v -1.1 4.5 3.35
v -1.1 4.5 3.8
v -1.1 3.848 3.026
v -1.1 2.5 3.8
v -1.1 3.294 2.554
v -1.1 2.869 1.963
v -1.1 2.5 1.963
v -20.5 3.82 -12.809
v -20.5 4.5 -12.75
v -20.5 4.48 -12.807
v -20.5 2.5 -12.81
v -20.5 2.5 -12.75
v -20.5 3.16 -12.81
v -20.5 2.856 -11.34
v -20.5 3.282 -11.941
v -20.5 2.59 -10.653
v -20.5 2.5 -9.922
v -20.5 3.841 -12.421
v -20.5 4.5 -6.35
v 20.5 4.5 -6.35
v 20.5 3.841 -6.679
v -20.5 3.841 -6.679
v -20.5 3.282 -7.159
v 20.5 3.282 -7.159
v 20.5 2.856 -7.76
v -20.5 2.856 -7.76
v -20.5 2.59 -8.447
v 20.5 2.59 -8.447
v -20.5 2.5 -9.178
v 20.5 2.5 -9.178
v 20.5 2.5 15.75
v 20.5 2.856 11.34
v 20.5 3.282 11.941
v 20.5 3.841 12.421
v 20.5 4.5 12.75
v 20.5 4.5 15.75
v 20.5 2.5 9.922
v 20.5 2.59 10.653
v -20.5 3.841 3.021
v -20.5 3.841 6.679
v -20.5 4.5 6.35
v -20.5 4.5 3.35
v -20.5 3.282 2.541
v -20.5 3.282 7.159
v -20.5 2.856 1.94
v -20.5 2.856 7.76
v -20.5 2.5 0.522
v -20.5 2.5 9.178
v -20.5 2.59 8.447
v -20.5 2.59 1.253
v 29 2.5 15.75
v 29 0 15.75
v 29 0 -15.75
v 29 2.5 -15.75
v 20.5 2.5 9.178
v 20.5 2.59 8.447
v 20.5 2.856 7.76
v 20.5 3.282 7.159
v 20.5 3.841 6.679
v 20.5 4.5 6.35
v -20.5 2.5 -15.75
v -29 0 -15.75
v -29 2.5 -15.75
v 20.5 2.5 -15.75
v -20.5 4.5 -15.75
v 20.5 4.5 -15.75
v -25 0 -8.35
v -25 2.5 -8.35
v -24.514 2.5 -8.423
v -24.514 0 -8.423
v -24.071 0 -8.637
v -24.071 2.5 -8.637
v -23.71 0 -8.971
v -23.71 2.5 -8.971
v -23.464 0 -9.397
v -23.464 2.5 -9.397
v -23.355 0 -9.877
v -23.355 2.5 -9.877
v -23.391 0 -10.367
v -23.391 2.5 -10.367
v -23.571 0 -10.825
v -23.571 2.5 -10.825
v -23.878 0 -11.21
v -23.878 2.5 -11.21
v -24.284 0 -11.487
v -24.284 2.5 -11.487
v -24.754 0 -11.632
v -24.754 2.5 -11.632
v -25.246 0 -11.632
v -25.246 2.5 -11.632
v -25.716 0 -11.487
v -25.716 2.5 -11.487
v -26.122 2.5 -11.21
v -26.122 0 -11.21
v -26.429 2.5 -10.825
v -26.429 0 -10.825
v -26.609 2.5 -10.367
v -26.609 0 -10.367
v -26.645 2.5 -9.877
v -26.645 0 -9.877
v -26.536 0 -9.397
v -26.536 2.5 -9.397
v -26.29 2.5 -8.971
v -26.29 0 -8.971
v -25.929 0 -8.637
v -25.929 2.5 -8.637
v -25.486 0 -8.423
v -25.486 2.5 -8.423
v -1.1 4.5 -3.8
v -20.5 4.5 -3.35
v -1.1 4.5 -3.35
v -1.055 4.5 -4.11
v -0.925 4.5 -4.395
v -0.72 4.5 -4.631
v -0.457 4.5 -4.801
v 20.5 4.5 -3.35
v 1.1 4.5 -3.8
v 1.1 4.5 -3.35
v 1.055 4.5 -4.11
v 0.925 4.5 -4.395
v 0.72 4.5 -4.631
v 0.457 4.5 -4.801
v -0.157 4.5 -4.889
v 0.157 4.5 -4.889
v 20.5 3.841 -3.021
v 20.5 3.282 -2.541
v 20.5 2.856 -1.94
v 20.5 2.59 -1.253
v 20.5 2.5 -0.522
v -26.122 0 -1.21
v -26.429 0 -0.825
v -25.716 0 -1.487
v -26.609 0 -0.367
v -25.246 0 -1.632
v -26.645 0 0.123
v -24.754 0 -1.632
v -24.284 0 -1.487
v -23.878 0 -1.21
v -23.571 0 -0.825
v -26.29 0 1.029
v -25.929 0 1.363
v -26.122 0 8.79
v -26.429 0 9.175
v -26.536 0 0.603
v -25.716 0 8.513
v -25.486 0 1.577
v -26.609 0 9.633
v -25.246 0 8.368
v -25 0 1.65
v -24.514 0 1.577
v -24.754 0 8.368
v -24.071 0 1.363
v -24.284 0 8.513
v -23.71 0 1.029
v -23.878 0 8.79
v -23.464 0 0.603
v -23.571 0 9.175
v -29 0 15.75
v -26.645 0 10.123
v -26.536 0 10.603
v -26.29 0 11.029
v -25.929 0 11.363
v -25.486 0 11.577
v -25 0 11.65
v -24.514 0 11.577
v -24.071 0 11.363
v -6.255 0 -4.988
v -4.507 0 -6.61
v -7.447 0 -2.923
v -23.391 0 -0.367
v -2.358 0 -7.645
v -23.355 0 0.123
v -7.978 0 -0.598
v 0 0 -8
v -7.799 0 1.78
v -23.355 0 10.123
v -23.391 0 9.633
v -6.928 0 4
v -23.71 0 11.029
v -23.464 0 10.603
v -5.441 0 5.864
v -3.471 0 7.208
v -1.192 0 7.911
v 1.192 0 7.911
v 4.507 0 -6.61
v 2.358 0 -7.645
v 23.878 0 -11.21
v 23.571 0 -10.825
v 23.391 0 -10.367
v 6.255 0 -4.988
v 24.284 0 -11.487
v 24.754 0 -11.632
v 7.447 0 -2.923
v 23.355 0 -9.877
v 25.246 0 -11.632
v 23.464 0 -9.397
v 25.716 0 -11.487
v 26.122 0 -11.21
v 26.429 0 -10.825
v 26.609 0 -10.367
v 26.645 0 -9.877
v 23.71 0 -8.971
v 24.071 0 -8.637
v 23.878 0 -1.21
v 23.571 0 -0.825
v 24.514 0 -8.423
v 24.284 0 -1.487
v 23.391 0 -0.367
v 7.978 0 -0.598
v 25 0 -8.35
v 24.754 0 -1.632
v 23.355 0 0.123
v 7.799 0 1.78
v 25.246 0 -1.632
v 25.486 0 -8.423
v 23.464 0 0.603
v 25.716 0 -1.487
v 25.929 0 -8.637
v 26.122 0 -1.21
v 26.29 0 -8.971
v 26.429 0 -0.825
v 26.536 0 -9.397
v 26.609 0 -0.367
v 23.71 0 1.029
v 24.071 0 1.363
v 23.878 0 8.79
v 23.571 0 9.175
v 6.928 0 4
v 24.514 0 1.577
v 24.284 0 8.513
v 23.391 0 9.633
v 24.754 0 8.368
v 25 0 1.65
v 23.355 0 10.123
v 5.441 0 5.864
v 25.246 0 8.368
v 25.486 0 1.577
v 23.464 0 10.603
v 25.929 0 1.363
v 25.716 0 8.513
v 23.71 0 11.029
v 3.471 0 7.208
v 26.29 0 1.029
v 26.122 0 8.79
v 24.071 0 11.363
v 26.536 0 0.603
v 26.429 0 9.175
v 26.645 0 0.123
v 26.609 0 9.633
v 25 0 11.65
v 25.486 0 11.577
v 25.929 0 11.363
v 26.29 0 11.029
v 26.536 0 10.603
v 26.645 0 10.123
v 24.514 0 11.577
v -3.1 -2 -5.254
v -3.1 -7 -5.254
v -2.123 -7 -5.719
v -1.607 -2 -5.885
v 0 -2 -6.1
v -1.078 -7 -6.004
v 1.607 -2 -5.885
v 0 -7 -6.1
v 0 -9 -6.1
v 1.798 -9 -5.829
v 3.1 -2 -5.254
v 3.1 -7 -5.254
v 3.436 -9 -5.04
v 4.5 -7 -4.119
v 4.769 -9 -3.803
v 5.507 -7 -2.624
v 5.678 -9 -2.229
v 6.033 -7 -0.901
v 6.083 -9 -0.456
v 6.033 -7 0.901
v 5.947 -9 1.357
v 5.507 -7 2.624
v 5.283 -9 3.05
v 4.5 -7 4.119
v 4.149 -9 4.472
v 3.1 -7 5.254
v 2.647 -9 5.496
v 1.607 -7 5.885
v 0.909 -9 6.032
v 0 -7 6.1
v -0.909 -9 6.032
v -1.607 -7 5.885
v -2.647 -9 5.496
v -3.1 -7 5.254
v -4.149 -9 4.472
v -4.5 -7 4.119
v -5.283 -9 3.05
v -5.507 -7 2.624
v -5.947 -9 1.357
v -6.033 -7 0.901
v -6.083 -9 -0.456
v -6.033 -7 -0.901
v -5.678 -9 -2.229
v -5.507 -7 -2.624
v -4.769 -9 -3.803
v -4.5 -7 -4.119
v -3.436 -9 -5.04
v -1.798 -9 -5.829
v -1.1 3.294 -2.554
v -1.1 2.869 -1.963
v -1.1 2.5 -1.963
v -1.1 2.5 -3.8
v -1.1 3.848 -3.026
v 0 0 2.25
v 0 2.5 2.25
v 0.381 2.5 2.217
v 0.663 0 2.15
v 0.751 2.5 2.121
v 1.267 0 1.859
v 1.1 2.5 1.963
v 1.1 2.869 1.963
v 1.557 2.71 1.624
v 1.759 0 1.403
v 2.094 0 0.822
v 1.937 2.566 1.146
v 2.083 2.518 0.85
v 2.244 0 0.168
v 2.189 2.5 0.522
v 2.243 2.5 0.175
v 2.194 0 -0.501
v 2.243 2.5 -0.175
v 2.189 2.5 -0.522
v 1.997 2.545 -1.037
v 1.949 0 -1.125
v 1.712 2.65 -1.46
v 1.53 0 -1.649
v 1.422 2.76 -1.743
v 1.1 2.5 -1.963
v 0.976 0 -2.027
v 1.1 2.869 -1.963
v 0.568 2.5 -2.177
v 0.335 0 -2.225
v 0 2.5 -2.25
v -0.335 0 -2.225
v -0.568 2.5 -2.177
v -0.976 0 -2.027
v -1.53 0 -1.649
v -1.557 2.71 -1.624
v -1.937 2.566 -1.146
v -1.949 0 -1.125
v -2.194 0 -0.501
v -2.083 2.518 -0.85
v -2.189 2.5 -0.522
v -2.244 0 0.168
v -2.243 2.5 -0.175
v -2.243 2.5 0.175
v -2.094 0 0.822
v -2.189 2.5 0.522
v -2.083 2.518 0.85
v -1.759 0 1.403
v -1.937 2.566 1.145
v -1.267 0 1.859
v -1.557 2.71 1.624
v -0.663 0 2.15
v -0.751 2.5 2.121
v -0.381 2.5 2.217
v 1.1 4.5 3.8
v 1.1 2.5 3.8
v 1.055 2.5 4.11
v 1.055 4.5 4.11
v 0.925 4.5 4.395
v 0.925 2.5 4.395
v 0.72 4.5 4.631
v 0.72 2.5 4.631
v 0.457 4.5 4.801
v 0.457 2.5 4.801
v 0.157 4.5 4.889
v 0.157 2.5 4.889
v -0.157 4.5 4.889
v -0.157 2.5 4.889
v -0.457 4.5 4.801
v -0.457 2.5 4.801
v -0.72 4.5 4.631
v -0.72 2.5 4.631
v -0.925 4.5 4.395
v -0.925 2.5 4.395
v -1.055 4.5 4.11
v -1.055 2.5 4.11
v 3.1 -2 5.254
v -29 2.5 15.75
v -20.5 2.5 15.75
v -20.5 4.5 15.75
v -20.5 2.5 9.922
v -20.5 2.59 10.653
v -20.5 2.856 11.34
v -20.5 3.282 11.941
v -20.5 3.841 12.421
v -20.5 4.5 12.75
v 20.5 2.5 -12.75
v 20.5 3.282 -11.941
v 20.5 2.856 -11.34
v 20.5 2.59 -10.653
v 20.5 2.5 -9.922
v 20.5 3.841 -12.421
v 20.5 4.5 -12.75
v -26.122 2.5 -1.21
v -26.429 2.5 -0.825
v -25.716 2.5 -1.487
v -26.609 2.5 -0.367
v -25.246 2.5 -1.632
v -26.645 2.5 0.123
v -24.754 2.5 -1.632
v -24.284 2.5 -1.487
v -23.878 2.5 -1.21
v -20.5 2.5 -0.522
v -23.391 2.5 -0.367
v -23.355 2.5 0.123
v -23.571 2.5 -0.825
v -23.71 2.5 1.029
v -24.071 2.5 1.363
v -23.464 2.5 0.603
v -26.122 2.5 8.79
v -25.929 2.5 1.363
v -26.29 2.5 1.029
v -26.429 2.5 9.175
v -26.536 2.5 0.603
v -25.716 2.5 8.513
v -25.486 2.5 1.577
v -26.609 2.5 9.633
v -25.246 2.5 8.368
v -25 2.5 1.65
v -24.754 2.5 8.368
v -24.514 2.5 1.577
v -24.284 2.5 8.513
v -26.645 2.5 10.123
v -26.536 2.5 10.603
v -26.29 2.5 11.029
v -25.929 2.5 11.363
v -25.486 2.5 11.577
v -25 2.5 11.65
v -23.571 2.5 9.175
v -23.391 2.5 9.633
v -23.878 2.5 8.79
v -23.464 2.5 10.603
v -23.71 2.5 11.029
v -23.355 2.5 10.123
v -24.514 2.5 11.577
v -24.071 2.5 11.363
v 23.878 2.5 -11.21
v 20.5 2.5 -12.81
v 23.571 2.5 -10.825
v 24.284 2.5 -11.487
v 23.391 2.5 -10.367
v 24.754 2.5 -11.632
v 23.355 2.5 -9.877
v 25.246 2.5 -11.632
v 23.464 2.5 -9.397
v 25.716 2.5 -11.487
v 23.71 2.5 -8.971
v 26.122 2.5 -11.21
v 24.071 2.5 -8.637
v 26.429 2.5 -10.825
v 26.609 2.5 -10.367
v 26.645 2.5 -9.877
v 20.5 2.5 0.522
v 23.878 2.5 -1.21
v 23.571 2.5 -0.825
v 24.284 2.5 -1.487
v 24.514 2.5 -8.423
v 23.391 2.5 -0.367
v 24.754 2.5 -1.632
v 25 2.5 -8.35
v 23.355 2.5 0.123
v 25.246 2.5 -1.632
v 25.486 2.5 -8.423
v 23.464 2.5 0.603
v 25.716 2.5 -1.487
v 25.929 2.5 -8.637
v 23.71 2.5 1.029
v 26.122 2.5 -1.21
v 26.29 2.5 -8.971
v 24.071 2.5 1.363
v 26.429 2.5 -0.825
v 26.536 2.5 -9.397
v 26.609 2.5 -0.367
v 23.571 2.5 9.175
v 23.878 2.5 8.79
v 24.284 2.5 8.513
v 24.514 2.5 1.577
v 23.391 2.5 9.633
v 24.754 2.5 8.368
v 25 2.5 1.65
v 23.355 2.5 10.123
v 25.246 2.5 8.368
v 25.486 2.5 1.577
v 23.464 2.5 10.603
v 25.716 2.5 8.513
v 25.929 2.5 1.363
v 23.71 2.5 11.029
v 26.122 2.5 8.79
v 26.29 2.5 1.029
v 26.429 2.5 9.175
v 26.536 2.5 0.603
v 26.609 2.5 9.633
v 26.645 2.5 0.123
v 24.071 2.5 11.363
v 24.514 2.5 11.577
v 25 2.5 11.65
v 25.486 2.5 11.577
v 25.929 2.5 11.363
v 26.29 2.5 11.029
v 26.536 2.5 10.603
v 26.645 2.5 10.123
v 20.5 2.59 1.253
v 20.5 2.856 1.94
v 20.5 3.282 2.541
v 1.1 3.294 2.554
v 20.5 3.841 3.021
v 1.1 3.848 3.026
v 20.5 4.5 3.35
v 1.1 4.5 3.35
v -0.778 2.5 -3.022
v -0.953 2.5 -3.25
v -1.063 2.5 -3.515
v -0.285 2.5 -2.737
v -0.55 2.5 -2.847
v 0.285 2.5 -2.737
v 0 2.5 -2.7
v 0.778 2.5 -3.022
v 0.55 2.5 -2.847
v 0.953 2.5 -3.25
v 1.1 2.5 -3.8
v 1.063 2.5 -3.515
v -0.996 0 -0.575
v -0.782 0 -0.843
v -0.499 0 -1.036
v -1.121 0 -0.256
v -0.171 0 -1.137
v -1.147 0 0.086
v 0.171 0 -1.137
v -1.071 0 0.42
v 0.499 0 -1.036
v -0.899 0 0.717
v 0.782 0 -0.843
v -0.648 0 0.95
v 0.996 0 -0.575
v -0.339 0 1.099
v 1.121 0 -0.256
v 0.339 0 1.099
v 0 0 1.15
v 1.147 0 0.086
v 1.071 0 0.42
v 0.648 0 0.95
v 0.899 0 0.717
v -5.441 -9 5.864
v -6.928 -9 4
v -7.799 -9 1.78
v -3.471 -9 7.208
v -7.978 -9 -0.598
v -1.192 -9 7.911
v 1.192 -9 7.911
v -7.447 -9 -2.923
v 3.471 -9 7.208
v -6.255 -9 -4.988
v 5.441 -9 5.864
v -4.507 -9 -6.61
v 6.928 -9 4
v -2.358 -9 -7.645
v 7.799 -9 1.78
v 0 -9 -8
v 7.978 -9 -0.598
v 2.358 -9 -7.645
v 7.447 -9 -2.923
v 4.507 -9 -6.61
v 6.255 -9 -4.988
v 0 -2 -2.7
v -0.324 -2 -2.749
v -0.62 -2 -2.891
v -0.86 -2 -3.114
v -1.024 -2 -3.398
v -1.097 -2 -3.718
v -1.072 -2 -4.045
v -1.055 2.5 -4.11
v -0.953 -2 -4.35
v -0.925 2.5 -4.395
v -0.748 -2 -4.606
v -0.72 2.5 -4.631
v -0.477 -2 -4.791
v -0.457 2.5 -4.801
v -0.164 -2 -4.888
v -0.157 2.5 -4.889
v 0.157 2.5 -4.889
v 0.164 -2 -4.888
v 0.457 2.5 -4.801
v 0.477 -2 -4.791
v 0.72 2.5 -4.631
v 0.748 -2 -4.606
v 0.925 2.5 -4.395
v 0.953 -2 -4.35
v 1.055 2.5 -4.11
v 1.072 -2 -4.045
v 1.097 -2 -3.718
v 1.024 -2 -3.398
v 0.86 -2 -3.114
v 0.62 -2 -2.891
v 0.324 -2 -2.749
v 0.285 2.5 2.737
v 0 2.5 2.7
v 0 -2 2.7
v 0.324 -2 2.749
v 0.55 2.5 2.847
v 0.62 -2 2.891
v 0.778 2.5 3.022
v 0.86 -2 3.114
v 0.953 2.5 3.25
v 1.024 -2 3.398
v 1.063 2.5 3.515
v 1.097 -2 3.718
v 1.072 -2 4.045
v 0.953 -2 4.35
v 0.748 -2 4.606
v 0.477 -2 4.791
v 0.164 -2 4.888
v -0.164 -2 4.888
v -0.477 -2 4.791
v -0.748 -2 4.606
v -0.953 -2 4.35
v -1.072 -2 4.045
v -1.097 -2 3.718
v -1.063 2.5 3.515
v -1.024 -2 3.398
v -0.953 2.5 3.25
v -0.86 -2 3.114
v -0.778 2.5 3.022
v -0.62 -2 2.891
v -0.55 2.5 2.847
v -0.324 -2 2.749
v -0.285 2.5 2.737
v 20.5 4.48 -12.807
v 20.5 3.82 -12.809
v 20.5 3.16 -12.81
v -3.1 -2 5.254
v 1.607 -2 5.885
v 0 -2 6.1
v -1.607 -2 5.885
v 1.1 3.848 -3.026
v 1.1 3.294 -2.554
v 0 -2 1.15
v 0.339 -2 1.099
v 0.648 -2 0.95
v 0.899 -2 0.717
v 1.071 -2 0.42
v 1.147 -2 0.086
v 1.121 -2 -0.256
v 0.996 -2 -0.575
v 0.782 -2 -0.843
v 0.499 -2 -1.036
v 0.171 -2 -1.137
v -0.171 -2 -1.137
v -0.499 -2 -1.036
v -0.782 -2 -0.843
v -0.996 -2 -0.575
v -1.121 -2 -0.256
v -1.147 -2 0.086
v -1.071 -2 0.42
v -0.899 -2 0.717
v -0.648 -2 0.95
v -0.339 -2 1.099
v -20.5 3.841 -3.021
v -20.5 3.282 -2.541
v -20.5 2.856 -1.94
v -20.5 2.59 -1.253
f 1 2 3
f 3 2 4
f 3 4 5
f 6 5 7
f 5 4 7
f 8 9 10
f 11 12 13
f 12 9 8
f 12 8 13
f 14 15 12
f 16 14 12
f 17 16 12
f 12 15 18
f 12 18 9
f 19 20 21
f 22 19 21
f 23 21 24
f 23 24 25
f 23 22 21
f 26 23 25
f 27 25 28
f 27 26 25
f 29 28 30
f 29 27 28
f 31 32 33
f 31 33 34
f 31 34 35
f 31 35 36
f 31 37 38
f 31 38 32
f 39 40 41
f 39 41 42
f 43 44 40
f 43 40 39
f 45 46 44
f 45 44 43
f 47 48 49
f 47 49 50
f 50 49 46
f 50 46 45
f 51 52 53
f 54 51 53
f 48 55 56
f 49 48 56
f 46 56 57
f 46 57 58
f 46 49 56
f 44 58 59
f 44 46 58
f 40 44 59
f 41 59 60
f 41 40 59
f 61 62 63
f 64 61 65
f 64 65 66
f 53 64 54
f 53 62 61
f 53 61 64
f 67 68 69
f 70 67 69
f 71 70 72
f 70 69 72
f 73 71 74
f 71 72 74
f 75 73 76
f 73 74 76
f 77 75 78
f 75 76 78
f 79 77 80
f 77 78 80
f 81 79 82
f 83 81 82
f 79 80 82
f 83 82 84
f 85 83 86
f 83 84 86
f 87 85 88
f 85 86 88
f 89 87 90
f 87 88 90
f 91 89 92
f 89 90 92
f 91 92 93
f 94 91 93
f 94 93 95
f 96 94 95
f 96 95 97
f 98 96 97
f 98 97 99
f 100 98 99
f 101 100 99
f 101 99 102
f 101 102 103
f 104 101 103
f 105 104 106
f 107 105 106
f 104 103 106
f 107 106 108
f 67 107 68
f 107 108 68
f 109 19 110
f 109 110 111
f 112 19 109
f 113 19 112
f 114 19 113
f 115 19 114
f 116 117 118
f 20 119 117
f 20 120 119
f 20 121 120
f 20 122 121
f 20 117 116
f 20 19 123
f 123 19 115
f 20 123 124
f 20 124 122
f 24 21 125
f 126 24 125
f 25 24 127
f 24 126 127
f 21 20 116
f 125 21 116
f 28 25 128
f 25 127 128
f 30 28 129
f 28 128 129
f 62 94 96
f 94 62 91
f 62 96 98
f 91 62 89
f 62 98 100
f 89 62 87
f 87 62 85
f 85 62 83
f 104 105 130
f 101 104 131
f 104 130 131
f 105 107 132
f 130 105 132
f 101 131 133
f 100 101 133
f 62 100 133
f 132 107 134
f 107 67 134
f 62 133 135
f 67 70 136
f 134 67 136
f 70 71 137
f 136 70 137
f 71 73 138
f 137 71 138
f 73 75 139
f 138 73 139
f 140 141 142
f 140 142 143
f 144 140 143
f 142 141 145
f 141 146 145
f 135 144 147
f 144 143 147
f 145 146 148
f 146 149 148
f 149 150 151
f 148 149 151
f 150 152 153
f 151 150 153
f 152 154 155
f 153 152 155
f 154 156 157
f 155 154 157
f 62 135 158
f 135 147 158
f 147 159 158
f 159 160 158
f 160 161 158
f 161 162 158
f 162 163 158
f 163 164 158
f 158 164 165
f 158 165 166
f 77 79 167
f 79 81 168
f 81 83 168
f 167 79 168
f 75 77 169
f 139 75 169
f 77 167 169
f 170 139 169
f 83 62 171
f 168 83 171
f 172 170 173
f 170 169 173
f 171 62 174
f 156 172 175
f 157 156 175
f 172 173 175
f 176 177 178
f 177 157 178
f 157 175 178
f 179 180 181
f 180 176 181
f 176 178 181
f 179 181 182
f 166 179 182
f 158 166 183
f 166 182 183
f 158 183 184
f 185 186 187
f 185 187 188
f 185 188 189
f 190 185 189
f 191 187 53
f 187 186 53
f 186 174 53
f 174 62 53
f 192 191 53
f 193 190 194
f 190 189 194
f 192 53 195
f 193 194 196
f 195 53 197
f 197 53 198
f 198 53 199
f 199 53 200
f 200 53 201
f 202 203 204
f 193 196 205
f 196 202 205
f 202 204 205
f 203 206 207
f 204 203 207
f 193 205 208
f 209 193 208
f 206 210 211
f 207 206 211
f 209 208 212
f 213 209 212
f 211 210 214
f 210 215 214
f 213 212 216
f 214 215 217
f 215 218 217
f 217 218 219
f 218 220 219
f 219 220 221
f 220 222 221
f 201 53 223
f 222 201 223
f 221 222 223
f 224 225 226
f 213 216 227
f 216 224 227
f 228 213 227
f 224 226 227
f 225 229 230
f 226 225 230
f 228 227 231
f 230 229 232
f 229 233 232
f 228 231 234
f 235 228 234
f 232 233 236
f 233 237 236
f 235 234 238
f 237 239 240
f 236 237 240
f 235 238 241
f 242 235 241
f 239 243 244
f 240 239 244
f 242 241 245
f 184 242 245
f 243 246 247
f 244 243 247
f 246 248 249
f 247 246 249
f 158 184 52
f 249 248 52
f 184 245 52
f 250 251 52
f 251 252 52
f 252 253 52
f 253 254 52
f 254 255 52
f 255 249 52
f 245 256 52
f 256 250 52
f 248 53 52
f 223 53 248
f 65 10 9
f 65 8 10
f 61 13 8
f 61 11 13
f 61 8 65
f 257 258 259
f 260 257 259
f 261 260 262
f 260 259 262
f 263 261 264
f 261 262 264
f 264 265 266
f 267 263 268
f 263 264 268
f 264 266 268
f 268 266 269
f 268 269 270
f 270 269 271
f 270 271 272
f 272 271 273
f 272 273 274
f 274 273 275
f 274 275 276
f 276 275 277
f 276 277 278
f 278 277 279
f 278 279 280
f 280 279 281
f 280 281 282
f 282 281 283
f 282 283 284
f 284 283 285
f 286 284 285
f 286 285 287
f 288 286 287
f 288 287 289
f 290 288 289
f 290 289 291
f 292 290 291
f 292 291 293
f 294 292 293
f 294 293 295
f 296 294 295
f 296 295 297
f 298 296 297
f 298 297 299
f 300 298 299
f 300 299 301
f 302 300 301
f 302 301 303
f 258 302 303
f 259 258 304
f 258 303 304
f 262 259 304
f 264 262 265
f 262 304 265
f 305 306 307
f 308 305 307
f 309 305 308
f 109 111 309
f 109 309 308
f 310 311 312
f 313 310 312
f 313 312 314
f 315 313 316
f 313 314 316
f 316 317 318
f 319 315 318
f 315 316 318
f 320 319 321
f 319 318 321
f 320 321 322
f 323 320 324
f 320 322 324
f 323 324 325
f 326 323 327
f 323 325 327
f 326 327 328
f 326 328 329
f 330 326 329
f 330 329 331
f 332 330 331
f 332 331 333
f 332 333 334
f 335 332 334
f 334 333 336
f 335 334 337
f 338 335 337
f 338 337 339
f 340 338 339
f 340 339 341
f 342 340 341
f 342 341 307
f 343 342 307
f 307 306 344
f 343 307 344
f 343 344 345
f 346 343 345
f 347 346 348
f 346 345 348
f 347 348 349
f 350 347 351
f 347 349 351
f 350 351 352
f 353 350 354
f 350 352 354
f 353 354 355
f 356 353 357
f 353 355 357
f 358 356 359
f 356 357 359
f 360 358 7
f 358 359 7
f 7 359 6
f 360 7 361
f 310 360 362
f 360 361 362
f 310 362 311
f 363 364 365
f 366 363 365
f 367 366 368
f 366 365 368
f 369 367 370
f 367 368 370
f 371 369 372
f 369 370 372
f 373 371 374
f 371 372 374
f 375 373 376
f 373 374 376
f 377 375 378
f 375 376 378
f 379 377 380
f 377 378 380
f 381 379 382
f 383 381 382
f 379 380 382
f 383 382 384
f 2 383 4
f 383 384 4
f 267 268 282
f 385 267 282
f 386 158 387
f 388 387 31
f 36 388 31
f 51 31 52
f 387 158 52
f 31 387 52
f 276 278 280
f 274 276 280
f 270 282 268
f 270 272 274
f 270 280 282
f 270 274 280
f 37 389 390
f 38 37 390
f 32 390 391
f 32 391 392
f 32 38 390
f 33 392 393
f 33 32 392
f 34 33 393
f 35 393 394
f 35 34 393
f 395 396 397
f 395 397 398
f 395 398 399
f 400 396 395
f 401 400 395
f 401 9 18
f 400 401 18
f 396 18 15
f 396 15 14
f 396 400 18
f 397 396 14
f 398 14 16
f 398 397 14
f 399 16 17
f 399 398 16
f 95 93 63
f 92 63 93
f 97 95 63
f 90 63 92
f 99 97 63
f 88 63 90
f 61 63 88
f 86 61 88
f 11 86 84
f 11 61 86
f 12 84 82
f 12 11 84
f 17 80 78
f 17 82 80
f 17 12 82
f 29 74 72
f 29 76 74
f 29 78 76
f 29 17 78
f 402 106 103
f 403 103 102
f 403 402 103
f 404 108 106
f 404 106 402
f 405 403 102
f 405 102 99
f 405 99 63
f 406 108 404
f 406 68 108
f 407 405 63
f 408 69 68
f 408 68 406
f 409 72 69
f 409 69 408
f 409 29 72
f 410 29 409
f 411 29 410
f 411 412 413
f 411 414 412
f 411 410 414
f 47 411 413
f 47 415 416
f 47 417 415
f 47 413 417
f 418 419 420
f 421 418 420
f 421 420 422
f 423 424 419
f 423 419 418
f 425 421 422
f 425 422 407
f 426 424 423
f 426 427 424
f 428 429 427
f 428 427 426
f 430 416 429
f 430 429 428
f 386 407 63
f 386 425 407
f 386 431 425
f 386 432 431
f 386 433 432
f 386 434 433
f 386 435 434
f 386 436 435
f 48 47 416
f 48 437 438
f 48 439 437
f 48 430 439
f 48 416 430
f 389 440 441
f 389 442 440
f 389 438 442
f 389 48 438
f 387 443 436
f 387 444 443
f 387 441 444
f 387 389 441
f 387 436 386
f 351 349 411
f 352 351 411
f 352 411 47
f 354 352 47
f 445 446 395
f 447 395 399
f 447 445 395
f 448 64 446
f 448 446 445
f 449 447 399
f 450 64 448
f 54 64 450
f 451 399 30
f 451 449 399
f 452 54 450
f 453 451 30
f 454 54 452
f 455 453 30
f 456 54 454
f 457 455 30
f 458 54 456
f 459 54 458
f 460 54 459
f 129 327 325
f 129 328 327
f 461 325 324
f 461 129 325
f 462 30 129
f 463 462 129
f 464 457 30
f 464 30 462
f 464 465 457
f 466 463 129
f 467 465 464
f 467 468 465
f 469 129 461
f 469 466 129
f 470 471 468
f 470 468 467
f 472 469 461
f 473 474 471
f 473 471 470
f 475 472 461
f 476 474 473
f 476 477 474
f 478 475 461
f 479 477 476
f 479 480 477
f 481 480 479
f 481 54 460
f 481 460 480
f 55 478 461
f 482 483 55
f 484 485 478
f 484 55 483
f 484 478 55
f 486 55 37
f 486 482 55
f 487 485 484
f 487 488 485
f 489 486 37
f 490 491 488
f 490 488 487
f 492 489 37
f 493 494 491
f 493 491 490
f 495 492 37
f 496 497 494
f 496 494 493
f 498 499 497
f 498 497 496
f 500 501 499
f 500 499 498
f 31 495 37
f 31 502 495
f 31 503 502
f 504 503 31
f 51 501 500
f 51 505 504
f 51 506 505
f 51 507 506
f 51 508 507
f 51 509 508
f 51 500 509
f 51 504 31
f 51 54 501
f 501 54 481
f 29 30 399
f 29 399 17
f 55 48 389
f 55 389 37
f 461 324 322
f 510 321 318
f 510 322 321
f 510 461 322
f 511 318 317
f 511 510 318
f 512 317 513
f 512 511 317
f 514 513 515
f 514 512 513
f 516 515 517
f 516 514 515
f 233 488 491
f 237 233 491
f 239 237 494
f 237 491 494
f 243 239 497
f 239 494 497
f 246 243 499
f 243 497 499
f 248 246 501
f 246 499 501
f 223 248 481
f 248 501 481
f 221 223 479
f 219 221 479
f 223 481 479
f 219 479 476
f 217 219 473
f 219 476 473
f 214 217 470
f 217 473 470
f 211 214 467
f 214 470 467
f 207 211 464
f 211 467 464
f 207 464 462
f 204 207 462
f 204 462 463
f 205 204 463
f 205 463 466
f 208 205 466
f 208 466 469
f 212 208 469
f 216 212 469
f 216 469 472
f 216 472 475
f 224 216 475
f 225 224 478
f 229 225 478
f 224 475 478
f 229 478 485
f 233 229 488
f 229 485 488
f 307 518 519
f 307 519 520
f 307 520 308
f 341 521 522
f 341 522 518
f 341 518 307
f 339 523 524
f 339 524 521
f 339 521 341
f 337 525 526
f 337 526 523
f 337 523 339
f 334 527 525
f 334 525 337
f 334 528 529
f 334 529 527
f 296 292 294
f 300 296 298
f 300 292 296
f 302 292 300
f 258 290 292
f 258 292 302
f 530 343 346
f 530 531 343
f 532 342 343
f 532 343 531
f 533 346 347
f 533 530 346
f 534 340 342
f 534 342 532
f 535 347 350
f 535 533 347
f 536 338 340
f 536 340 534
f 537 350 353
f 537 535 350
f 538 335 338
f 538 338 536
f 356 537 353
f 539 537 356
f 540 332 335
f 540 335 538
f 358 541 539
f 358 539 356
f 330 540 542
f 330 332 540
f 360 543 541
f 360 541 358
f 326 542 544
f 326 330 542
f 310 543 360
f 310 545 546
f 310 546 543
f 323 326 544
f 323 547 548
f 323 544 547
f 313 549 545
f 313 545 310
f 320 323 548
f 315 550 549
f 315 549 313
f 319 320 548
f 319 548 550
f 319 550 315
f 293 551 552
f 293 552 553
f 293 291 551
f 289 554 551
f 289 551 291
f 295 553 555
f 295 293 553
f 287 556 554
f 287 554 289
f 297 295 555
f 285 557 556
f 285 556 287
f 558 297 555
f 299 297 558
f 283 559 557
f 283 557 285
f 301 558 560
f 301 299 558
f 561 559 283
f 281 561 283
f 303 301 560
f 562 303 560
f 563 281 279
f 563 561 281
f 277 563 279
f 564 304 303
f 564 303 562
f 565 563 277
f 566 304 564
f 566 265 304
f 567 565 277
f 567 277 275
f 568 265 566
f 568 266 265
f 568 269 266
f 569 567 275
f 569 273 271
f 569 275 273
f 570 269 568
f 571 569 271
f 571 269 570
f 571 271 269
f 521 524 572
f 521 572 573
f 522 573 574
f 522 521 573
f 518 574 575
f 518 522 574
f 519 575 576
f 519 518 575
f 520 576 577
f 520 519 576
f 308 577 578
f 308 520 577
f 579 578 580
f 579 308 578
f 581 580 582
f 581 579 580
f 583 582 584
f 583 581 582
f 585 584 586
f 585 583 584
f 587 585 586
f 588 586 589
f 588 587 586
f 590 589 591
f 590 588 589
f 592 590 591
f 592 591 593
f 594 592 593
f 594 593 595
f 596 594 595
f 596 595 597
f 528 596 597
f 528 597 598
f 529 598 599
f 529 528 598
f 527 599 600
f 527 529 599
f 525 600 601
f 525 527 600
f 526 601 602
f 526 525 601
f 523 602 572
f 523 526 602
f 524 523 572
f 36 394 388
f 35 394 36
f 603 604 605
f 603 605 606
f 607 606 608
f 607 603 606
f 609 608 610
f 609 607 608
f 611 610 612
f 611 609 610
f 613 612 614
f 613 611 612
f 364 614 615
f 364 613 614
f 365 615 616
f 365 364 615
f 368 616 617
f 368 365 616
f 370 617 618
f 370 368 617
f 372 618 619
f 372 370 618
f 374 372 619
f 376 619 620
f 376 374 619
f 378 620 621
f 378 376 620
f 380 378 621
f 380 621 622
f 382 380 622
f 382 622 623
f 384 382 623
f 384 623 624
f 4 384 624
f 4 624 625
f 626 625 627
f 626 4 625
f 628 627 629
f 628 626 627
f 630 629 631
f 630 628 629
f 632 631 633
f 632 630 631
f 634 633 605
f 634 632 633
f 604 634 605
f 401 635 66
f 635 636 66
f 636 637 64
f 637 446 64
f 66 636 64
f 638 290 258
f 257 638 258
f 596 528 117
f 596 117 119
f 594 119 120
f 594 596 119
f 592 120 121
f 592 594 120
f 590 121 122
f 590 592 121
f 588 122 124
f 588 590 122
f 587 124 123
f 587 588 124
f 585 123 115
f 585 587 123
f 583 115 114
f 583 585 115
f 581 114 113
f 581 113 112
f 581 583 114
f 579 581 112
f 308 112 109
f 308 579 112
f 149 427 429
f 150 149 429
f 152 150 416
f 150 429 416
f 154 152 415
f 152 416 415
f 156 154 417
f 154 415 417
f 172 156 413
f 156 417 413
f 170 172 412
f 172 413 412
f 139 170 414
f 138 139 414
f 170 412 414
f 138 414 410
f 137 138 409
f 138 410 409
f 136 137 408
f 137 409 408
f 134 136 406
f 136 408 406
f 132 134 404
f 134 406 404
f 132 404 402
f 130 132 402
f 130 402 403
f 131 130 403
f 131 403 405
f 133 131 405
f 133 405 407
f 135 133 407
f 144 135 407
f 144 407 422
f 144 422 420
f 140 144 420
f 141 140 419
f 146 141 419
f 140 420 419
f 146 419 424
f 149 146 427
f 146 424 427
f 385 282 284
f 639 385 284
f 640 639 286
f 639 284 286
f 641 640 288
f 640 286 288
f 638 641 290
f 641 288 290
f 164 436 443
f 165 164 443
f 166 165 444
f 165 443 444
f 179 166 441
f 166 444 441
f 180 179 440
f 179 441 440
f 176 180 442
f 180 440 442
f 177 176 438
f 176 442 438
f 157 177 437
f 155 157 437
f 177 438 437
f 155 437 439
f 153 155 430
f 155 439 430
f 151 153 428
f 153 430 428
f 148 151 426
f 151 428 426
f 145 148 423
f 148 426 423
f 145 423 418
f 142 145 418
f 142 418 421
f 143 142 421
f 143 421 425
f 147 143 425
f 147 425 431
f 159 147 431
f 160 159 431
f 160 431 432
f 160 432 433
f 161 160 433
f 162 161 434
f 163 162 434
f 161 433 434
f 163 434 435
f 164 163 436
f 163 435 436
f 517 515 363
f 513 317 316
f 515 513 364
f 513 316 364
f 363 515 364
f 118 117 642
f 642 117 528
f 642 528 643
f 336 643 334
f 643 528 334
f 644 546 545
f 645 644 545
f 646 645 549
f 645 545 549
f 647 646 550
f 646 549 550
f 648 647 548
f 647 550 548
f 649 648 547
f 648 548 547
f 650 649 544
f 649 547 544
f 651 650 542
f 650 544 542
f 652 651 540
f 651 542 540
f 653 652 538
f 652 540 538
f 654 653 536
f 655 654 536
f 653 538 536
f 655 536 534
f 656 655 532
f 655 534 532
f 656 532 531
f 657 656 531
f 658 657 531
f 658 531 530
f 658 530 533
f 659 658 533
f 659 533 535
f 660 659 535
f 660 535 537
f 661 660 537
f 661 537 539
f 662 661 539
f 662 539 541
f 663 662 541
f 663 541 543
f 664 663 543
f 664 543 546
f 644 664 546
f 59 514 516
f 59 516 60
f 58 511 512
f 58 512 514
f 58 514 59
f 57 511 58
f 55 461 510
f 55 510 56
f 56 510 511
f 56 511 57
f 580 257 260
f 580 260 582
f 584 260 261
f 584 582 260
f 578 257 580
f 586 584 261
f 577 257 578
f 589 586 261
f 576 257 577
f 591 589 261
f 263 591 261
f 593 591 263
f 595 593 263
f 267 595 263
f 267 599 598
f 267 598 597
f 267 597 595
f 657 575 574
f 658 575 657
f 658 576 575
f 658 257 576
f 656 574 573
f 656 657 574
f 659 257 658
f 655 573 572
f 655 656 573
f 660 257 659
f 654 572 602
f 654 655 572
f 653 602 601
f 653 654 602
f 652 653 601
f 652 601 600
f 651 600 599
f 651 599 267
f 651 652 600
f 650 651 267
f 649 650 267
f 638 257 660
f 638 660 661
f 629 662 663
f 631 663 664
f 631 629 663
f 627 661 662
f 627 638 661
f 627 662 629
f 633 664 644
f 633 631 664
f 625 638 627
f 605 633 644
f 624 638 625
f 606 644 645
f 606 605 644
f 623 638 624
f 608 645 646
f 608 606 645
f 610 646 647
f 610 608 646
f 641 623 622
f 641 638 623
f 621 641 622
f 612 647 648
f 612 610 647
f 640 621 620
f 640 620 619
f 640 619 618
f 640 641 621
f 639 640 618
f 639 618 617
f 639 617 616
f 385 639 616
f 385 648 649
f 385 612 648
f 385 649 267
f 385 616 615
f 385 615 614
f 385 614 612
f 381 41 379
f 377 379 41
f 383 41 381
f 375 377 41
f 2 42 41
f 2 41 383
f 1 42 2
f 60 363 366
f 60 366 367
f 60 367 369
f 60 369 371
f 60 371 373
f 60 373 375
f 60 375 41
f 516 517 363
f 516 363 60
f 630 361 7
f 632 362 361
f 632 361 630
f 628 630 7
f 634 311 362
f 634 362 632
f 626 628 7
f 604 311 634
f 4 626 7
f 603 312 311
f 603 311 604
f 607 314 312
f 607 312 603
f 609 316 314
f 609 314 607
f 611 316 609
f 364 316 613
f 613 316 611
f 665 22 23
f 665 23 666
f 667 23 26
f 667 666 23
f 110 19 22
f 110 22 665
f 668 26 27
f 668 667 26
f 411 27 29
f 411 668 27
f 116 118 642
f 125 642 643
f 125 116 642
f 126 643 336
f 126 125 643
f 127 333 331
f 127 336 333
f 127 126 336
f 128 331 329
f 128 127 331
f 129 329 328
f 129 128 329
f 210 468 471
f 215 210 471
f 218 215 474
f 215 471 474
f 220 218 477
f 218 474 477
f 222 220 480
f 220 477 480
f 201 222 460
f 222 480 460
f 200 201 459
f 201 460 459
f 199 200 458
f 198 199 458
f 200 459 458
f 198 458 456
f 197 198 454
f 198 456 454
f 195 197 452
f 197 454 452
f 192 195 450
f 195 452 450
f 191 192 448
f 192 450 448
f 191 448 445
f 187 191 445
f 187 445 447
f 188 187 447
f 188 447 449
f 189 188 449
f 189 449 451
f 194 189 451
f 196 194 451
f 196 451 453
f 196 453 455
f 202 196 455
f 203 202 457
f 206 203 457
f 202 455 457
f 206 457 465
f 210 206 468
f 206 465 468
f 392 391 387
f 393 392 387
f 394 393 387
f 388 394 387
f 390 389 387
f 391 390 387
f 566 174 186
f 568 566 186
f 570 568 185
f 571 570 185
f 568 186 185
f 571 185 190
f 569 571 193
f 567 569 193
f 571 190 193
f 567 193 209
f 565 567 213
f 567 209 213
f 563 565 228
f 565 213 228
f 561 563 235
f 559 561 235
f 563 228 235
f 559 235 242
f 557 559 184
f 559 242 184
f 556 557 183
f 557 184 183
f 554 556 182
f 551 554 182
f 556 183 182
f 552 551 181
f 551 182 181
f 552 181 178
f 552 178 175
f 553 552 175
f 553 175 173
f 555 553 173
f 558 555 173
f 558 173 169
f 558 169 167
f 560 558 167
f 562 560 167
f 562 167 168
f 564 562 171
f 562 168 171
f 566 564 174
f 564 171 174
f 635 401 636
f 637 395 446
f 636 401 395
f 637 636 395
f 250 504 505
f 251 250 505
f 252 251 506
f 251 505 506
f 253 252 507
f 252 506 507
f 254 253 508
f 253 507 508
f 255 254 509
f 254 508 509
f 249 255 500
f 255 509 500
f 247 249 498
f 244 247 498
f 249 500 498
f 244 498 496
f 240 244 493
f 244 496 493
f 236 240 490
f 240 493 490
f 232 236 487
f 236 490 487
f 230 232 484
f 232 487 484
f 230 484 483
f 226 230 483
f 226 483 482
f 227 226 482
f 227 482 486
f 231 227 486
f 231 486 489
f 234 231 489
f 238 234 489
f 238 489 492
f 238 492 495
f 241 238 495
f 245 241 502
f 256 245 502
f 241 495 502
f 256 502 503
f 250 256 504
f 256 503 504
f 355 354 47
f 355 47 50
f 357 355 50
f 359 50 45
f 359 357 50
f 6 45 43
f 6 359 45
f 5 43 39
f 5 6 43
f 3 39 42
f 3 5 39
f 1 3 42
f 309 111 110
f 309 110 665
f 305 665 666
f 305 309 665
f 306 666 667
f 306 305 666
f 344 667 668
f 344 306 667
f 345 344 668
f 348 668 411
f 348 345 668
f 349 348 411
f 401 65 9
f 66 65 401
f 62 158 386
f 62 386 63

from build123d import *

# Parameters (mm, degrees)
SKETCH_1_R               = 50
EXTRUDE_1_DEPTH          = 2.5
SKETCH_2_R               = 8
EXTRUDE_2_DEPTH          = 9
SKETCH_3_R               = 6.1
CUT_EXTRUDE_1_DEPTH      = 2
CUT_EXTRUDE_2_DEPTH      = 5
SKETCH_7_R               = 1.15
CUT_EXTRUDE_4_DEPTH      = 4.5
SKETCH_8_R               = 2.25
CUT_EXTRUDE_5_DEPTH      = 2.5
CUT_EXTRUDE_6_DEPTH      = 72.281133549
CUT_EXTRUDE_6_DEPTH_BACK = 72.281133549
SKETCH_11_R              = 1.1
SKETCH_14_R              = 1.65
CUT_EXTRUDE_7_DEPTH      = 2.5
CUT_EXTRUDE_START        = -2.5
SKETCH_15_R              = 50
SKETCH_15_W              = 58
SKETCH_15_H              = 31.5
CUT_EXTRUDE_8_DEPTH      = 2.5
SKETCH_16_W              = 41
SKETCH_16_H              = 3
EXTRUDE_4_DEPTH          = 2
CUT_EXTRUDE_9_DEPTH      = 2
FILLET_3_R               = 3


with BuildPart() as part:
    # Эскиз1 → Бобышка-Вытянуть1 (new body)
    with BuildSketch(Plane(origin=(0, 0, 0), x_dir=(1, 0, 0), z_dir=(0, 1, 0))):
        with Locations(Location((0, 0, 0), (0, 0, 270))):
            Circle(SKETCH_1_R)
    extrude(amount=EXTRUDE_1_DEPTH)

    # Эскиз2 → Бобышка-Вытянуть2 (add)
    with BuildSketch(Plane.XZ):
        with Locations(Location((0, 0, 0), (0, 0, 270))):
            Circle(SKETCH_2_R)
    extrude(amount=EXTRUDE_2_DEPTH)

    # Эскиз3 → Вырез-Вытянуть1 (cut)
    with BuildSketch(Plane.XZ.offset(9)):
        with Locations(Location((0, 0, 0), (0, 0, 270))):
            Circle(SKETCH_3_R)
    extrude(amount=-CUT_EXTRUDE_1_DEPTH, mode=Mode.SUBTRACT)

    # Эскиз4 → Вырез-Вытянуть2 (cut)
    with BuildSketch(Plane.XZ.offset(7)):
        with BuildLine():
            Line((-3.1, 5.253570215), (-3.1, -5.253570215))
            ThreePointArc((-3.1, -5.253570215), (0, -6.1), (3.1, -5.253570215))
            Line((3.1, -5.253570215), (3.1, 5.253570215))
            ThreePointArc((3.1, 5.253570215), (0, 6.1), (-3.1, 5.253570215))
        make_face()
    extrude(amount=-CUT_EXTRUDE_2_DEPTH, mode=Mode.SUBTRACT)

    # Эскиз7 → Вырез-Вытянуть4 (cut)
    with BuildSketch(Plane(origin=(0, 2.5, 0), x_dir=(1, 0, 0), z_dir=(0, 1, 0))):
        with Locations(Location((0, 0, 0), (0, 0, 270))):
            Circle(SKETCH_7_R)
    extrude(amount=-CUT_EXTRUDE_4_DEPTH, mode=Mode.SUBTRACT)

    # Эскиз8 → Вырез-Вытянуть5 (cut)
    with BuildSketch(Plane(origin=(0, 2.5, 0), x_dir=(1, 0, 0), z_dir=(0, 1, 0))):
        with Locations(Location((0, 0, 0), (0, 0, 270))):
            Circle(SKETCH_8_R)
    extrude(amount=-CUT_EXTRUDE_5_DEPTH, mode=Mode.SUBTRACT)

    # Эскиз11 → Вырез-Вытянуть6 (cut, two sides: drawn at the far end of the back side and taken through both)
    with BuildSketch(Plane.XZ.offset(-CUT_EXTRUDE_6_DEPTH_BACK)):
        with Locations(Location((0, 3.8, 0), (0, 0, 270))):
            Circle(SKETCH_11_R)
        with Locations(Location((0, -3.8, 0), (0, 0, 90))):
            Circle(SKETCH_11_R)
    extrude(amount=CUT_EXTRUDE_6_DEPTH + CUT_EXTRUDE_6_DEPTH_BACK, mode=Mode.SUBTRACT)

    # Эскиз14 → Вырез-Вытянуть7 (cut)
    with BuildSketch(Plane(origin=(0, 2.5, 0), x_dir=(1, 0, 0), z_dir=(0, 1, 0))):
        with Locations(Location((-25, 0, 0), (0, 0, 270))):
            Circle(SKETCH_14_R)
        with Locations(Location((-25, 10, 0), (0, 0, 270))):
            Circle(SKETCH_14_R)
        with Locations(Location((-25, -10, 0), (0, 0, 270))):
            Circle(SKETCH_14_R)
        with Locations(Location((25, -10, 0), (0, 0, 270))):
            Circle(SKETCH_14_R)
        with Locations(Location((25, 0, 0), (0, 0, 270))):
            Circle(SKETCH_14_R)
        with Locations(Location((25, 10, 0), (0, 0, 270))):
            Circle(SKETCH_14_R)
    extrude(amount=-CUT_EXTRUDE_7_DEPTH, mode=Mode.SUBTRACT)

    # Эскиз15 → Вырез-Вытянуть8 (cut)
    with BuildSketch(Plane(origin=(0, 2.5, 0), x_dir=(1, 0, 0), z_dir=(0, 1, 0)).offset(CUT_EXTRUDE_START)):
        Circle(SKETCH_15_R)
        Rectangle(SKETCH_15_W, SKETCH_15_H, mode=Mode.SUBTRACT)
    extrude(amount=CUT_EXTRUDE_8_DEPTH, mode=Mode.SUBTRACT)

    # Эскиз16 → Бобышка-Вытянуть4 (add)
    with BuildSketch(Plane(origin=(0, 2.5, 0), x_dir=(1, 0, 0), z_dir=(0, 1, 0))):
        with Locations((0, 14.25)):
            Rectangle(SKETCH_16_W, SKETCH_16_H)
        with Locations((0, 4.85)):
            Rectangle(SKETCH_16_W, SKETCH_16_H)
        with Locations((0, -4.85)):
            Rectangle(SKETCH_16_W, SKETCH_16_H)
        with Locations((0, -14.25)):
            Rectangle(SKETCH_16_W, SKETCH_16_H)
    extrude(amount=EXTRUDE_4_DEPTH)

    # Эскиз17 → Вырез-Вытянуть9 (cut)
    with BuildSketch(Plane(origin=(0, 2.5, 0), x_dir=(1, 0, 0), z_dir=(0, 1, 0))):
        with BuildLine():
            Line((-1.1, 3.8), (-1.1, 2.7))
            Line((-1.1, 2.7), (1.1, 2.7))
            Line((1.1, 2.7), (1.1, 3.8))
            ThreePointArc((1.1, 3.8), (0, 4.9), (-1.1, 3.8))
        make_face()
        with BuildLine():
            Line((-1.1, -3.8), (-1.1, -2.7))
            Line((-1.1, -2.7), (1.1, -2.7))
            Line((1.1, -2.7), (1.1, -3.8))
            ThreePointArc((1.1, -3.8), (0, -4.9), (-1.1, -3.8))
        make_face()
    extrude(amount=CUT_EXTRUDE_9_DEPTH, mode=Mode.SUBTRACT)

    # Скругление3
    # the kernel refuses this fillet: 3 mm, written as the material it adds along each edge
    with BuildSketch(Plane(origin=(20.5, 2.5, 12.75), x_dir=(0, 0, -1), z_dir=(-1, 0, 0)), Plane(origin=(-20.5, 2.5, 6.35), x_dir=(0, 0, 1), z_dir=(1, 0, 0))) as fillet_3_piece_1:
        with BuildLine():
            CenterArc((2.828427125, -3), FILLET_3_R, 90, 70.528779366)
            Line((0, -2), (-0.056568542, -1.98))
            ThreePointArc((-0.056568542, -1.98), (-0.06, -1), (-0.06, 0))
            Line((-0.06, 0), (0, 0.06))
            Line((0, 0.06), (2.828427125, 0.06))
            Line((2.828427125, 0.06), (2.828427125, 0))
        make_face()
    extrude(amount=41)
    with BuildSketch(Plane(origin=(20.5, 2.5, 3.35), x_dir=(0, 0, -1), z_dir=(-1, 0, 0))) as fillet_3_piece_2_section:
        with BuildLine():
            CenterArc((2.828427125, -3), FILLET_3_R, 90, 70.528779366)
            Line((0, -2), (-0.056568542, -1.98))
            ThreePointArc((-0.056568542, -1.98), (-0.06, -1), (-0.06, 0))
            Line((-0.06, 0), (0, 0.06))
            Line((0, 0.06), (2.828427125, 0.06))
            Line((2.828427125, 0.06), (2.828427125, 0))
        make_face()
    fillet_3_piece_2 = extrude(amount=19.4, mode=Mode.PRIVATE)
    fillet_3_piece_2 = fillet_3_piece_2 - Plane(origin=(0, 3.015381172, 0), x_dir=(0, 0, 1), z_dir=(0, 1, 0)) * Cylinder(2.25, 51, mode=Mode.PRIVATE)
    add(fillet_3_piece_2)
    with BuildSketch(Plane(origin=(20.5, 2.5, 3.35), x_dir=(0, 0, -1), z_dir=(-1, 0, 0))) as fillet_3_piece_3_section:
        with BuildLine():
            CenterArc((2.828427125, -3), FILLET_3_R, 90, 70.528779366)
            Line((0, -2), (-0.056568542, -1.98))
            ThreePointArc((-0.056568542, -1.98), (-0.06, -1), (-0.06, 0))
            Line((-0.06, 0), (0, 0.06))
            Line((0, 0.06), (2.828427125, 0.06))
            Line((2.828427125, 0.06), (2.828427125, 0))
        make_face()
    fillet_3_piece_3 = extrude(amount=26.471067812, mode=Mode.PRIVATE)
    fillet_3_piece_3 = fillet_3_piece_3 - Plane(origin=(0, 3.020982336, 0), x_dir=(0, 0, 1), z_dir=(0, 1, 0)) * Cylinder(2.25, 65, mode=Mode.PRIVATE)
    fillet_3_piece_3 = split(fillet_3_piece_3, bisect_by=Plane(origin=(-1.1, 3.020982336, 2.69327095), z_dir=(-1, 0, 0)), keep=Keep.TOP, mode=Mode.PRIVATE)
    add(fillet_3_piece_3)
    with BuildSketch(Plane(origin=(5.971067812, 2.5, 3.35), x_dir=(0, 0, -1), z_dir=(-1, 0, 0))) as fillet_3_piece_4_section:
        with BuildLine():
            CenterArc((2.828427125, -3), FILLET_3_R, 90, 70.528779366)
            Line((0, -2), (-0.056568542, -1.98))
            ThreePointArc((-0.056568542, -1.98), (-0.06, -1), (-0.06, 0))
            Line((-0.06, 0), (0, 0.06))
            Line((0, 0.06), (2.828427125, 0.06))
            Line((2.828427125, 0.06), (2.828427125, 0))
        make_face()
    fillet_3_piece_4 = extrude(amount=26.471067812, mode=Mode.PRIVATE)
    fillet_3_piece_4 = fillet_3_piece_4 - Plane(origin=(0, 3.020982326, 0), x_dir=(0, 0, 1), z_dir=(0, 1, 0)) * Cylinder(2.25, 65, mode=Mode.PRIVATE)
    fillet_3_piece_4 = split(fillet_3_piece_4, bisect_by=Plane(origin=(1.1, 3.020982326, 2.69327092), z_dir=(1, 0, 0)), keep=Keep.TOP, mode=Mode.PRIVATE)
    add(fillet_3_piece_4)
    with BuildSketch(Plane(origin=(-1.1, 2.5, 3.35), x_dir=(0, 0, -1), z_dir=(-1, 0, 0))) as fillet_3_piece_5_section:
        with BuildLine():
            CenterArc((2.828427125, -3), FILLET_3_R, 90, 70.528779366)
            Line((0, -2), (-0.056568542, -1.98))
            ThreePointArc((-0.056568542, -1.98), (-0.06, -1), (-0.06, 0))
            Line((-0.06, 0), (0, 0.06))
            Line((0, 0.06), (2.828427125, 0.06))
            Line((2.828427125, 0.06), (2.828427125, 0))
        make_face()
    fillet_3_piece_5 = extrude(amount=19.4, mode=Mode.PRIVATE)
    fillet_3_piece_5 = fillet_3_piece_5 - Plane(origin=(0, 3.015381179, 0), x_dir=(0, 0, 1), z_dir=(0, 1, 0)) * Cylinder(2.25, 51, mode=Mode.PRIVATE)
    add(fillet_3_piece_5)
    with BuildSketch(Plane(origin=(5.971067812, 2.5, -3.35), x_dir=(0, 0, 1), z_dir=(-1, 0, 0))) as fillet_3_piece_6_section:
        with BuildLine():
            CenterArc((2.828427125, 3), FILLET_3_R, 199.471220634, 70.528779366)
            Line((0, 2), (-0.056568542, 1.98))
            ThreePointArc((-0.056568542, 1.98), (-0.06, 1), (-0.06, 0))
            Line((-0.06, 0), (0, -0.06))
            Line((0, -0.06), (2.828427125, -0.06))
            Line((2.828427125, -0.06), (2.828427125, 0))
        make_face()
    fillet_3_piece_6 = extrude(amount=26.471067812, mode=Mode.PRIVATE)
    fillet_3_piece_6 = fillet_3_piece_6 - Plane(origin=(0, 3.020982336, 0), x_dir=(0, 0, 1), z_dir=(0, 1, 0)) * Cylinder(2.25, 65, mode=Mode.PRIVATE)
    fillet_3_piece_6 = split(fillet_3_piece_6, bisect_by=Plane(origin=(1.1, 3.020982336, -2.69327095), z_dir=(1, 0, 0)), keep=Keep.TOP, mode=Mode.PRIVATE)
    add(fillet_3_piece_6)
    with BuildSketch(Plane(origin=(-1.1, 2.5, -3.35), x_dir=(0, 0, 1), z_dir=(-1, 0, 0))) as fillet_3_piece_7_section:
        with BuildLine():
            CenterArc((2.828427125, 3), FILLET_3_R, 199.471220634, 70.528779366)
            Line((0, 2), (-0.056568542, 1.98))
            ThreePointArc((-0.056568542, 1.98), (-0.06, 1), (-0.06, 0))
            Line((-0.06, 0), (0, -0.06))
            Line((0, -0.06), (2.828427125, -0.06))
            Line((2.828427125, -0.06), (2.828427125, 0))
        make_face()
    fillet_3_piece_7 = extrude(amount=19.4, mode=Mode.PRIVATE)
    fillet_3_piece_7 = fillet_3_piece_7 - Plane(origin=(0, 3.015381172, 0), x_dir=(0, 0, 1), z_dir=(0, 1, 0)) * Cylinder(2.25, 51, mode=Mode.PRIVATE)
    add(fillet_3_piece_7)
    with BuildSketch(Plane(origin=(20.5, 2.5, -3.35), x_dir=(0, 0, 1), z_dir=(-1, 0, 0))) as fillet_3_piece_8_section:
        with BuildLine():
            CenterArc((2.828427125, 3), FILLET_3_R, 199.471220634, 70.528779366)
            Line((0, 2), (-0.056568542, 1.98))
            ThreePointArc((-0.056568542, 1.98), (-0.06, 1), (-0.06, 0))
            Line((-0.06, 0), (0, -0.06))
            Line((0, -0.06), (2.828427125, -0.06))
            Line((2.828427125, -0.06), (2.828427125, 0))
        make_face()
    fillet_3_piece_8 = extrude(amount=19.4, mode=Mode.PRIVATE)
    fillet_3_piece_8 = fillet_3_piece_8 - Plane(origin=(0, 3.015381179, 0), x_dir=(0, 0, 1), z_dir=(0, 1, 0)) * Cylinder(2.25, 51, mode=Mode.PRIVATE)
    add(fillet_3_piece_8)
    with BuildSketch(Plane(origin=(20.5, 2.5, -3.35), x_dir=(0, 0, 1), z_dir=(-1, 0, 0))) as fillet_3_piece_9_section:
        with BuildLine():
            CenterArc((2.828427125, 3), FILLET_3_R, 199.471220634, 70.528779366)
            Line((0, 2), (-0.056568542, 1.98))
            ThreePointArc((-0.056568542, 1.98), (-0.06, 1), (-0.06, 0))
            Line((-0.06, 0), (0, -0.06))
            Line((0, -0.06), (2.828427125, -0.06))
            Line((2.828427125, -0.06), (2.828427125, 0))
        make_face()
    fillet_3_piece_9 = extrude(amount=26.471067812, mode=Mode.PRIVATE)
    fillet_3_piece_9 = fillet_3_piece_9 - Plane(origin=(0, 3.020982325, 0), x_dir=(0, 0, 1), z_dir=(0, 1, 0)) * Cylinder(2.25, 65, mode=Mode.PRIVATE)
    fillet_3_piece_9 = split(fillet_3_piece_9, bisect_by=Plane(origin=(-1.1, 3.020982325, -2.69327092), z_dir=(-1, 0, 0)), keep=Keep.TOP, mode=Mode.PRIVATE)
    add(fillet_3_piece_9)
    with BuildSketch(Plane(origin=(-20.5, 2.5, -6.35), x_dir=(0, 0, -1), z_dir=(1, 0, 0)), Plane(origin=(20.5, 2.5, -12.75), x_dir=(0, 0, 1), z_dir=(-1, 0, 0))) as fillet_3_piece_10:
        with BuildLine():
            CenterArc((2.828427125, 3), FILLET_3_R, 199.471220634, 70.528779366)
            Line((0, 2), (-0.056568542, 1.98))
            ThreePointArc((-0.056568542, 1.98), (-0.06, 1), (-0.06, 0))
            Line((-0.06, 0), (0, -0.06))
            Line((0, -0.06), (2.828427125, -0.06))
            Line((2.828427125, -0.06), (2.828427125, 0))
        make_face()
    extrude(amount=41)


solid = part.part
